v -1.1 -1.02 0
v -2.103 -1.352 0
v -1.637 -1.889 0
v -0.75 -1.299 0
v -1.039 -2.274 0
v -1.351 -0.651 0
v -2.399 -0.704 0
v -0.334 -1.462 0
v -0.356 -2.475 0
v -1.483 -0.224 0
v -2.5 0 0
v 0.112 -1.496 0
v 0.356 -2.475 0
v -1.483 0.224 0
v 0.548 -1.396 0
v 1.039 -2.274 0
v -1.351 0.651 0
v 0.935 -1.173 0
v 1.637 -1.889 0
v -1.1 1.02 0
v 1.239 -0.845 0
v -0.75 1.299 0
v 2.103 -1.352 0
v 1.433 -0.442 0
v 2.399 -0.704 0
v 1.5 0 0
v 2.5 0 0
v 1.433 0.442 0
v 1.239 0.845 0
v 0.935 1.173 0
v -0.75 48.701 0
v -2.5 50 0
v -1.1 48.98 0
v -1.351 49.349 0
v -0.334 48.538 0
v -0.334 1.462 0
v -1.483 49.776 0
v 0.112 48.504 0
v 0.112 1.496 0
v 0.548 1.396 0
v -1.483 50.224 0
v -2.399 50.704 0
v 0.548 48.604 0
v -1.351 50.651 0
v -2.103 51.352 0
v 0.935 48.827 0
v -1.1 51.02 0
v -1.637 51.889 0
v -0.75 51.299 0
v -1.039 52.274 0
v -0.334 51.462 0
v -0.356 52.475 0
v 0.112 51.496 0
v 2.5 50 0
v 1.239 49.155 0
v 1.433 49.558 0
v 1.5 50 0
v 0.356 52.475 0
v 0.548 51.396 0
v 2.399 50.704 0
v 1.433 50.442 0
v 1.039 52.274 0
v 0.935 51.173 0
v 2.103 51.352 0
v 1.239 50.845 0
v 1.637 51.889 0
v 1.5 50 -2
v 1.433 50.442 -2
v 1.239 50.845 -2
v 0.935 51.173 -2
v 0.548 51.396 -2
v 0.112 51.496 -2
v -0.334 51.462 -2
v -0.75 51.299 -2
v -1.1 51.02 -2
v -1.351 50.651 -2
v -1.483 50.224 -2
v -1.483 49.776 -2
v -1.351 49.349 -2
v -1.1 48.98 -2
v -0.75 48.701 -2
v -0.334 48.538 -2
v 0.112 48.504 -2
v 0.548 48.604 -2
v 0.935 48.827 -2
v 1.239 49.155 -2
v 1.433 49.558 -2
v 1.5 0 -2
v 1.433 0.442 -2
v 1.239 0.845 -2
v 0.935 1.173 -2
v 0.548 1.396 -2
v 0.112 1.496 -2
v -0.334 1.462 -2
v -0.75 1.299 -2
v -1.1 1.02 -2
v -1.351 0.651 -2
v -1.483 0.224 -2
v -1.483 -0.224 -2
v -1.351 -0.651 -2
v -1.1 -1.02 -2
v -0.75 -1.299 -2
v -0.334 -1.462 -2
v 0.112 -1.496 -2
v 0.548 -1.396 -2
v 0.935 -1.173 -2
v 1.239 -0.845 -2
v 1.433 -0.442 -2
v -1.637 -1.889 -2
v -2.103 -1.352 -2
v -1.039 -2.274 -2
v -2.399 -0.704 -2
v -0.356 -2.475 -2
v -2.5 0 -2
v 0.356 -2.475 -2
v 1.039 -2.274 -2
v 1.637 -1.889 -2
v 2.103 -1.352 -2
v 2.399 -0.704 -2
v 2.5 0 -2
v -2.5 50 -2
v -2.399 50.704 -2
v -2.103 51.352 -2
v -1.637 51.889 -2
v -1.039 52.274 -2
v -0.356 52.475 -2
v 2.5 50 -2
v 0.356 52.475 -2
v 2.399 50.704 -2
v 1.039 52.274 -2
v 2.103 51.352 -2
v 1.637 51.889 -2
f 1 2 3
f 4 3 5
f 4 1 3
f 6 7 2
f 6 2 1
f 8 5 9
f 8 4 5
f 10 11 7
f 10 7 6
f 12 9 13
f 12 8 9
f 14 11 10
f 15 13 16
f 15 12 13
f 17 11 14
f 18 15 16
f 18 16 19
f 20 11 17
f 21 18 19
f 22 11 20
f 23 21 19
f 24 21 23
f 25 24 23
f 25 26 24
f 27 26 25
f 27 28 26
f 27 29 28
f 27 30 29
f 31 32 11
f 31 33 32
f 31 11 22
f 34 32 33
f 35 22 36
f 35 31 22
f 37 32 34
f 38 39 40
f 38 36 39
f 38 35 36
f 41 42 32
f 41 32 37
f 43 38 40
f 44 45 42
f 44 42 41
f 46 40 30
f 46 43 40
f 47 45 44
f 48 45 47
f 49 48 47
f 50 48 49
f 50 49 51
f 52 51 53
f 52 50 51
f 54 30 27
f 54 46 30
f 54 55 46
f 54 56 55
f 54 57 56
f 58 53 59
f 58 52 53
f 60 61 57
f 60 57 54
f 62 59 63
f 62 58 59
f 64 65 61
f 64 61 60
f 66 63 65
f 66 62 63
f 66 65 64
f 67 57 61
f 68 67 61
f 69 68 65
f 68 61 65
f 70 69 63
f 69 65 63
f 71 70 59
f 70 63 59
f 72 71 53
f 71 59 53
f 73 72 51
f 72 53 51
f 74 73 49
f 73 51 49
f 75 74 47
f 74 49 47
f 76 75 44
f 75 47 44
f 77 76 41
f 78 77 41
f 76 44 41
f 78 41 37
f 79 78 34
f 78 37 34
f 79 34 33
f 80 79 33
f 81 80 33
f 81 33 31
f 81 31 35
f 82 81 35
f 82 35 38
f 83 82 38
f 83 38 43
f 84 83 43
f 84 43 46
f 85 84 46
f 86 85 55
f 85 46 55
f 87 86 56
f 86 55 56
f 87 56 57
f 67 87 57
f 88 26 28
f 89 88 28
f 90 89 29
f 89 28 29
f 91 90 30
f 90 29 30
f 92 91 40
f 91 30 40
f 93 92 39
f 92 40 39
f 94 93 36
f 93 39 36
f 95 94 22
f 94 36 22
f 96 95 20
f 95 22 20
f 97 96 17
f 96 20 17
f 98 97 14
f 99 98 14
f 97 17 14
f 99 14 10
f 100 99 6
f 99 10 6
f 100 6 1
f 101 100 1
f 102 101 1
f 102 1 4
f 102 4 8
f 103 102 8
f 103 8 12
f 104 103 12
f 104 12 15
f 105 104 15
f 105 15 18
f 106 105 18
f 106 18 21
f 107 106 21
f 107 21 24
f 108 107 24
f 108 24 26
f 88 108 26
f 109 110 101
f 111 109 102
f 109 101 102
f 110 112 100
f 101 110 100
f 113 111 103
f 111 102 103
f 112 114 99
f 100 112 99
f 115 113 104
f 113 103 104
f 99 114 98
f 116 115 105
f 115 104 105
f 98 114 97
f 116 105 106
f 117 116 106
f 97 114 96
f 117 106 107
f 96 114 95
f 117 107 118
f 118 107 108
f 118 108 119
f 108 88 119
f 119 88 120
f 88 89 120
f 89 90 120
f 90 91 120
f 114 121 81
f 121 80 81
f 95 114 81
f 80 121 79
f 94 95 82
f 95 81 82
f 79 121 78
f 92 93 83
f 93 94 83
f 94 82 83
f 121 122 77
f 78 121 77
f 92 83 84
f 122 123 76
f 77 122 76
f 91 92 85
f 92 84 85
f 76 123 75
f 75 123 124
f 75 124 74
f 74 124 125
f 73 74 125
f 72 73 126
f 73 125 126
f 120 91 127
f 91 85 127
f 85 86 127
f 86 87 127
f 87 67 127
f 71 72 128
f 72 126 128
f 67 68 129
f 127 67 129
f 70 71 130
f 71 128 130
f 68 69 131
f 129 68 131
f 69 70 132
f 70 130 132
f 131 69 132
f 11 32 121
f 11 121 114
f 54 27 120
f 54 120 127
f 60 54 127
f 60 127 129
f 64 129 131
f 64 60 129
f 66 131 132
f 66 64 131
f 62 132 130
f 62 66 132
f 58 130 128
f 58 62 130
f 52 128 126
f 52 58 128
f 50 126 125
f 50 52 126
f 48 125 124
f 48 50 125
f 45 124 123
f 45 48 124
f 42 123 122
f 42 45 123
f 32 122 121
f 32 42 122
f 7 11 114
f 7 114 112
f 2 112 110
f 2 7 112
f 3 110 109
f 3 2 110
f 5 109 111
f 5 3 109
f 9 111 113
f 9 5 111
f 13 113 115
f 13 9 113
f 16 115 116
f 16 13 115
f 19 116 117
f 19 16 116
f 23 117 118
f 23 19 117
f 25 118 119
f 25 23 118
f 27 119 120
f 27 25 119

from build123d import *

# Parameters (mm, degrees)
Y_KSEKLIK_EKSTR_ZYON1_DEPTH = 2
IZIM3_R                     = 1.5
KES_EKSTR_ZYON1_DEPTH       = 3
IZIM5_R                     = 1.5
KES_EKSTR_ZYON2_DEPTH       = 2


with BuildPart() as part:
    # Çizim1 → Yükseklik-Ekstrüzyon1 (new body)
    with BuildSketch(Plane.XY):
        with BuildLine():
            Line((-2.5, 50), (-2.5, 0))
            ThreePointArc((-2.5, 0), (0, -2.5), (2.5, 0))
            Line((2.5, 0), (2.5, 50))
            ThreePointArc((2.5, 50), (0, 52.5), (-2.5, 50))
        make_face()
    extrude(amount=-Y_KSEKLIK_EKSTR_ZYON1_DEPTH)

    # Çizim3 → Kes-Ekstrüzyon1 (cut, through all)
    with BuildSketch(Plane.XY):
        Circle(IZIM3_R)
    extrude(amount=-KES_EKSTR_ZYON1_DEPTH, mode=Mode.SUBTRACT)

    # Çizim5 → Kes-Ekstrüzyon2 (cut)
    with BuildSketch(Plane.XY):
        with Locations((0, 50)):
            Circle(IZIM5_R)
    extrude(amount=-KES_EKSTR_ZYON2_DEPTH, mode=Mode.SUBTRACT)


solid = part.part
